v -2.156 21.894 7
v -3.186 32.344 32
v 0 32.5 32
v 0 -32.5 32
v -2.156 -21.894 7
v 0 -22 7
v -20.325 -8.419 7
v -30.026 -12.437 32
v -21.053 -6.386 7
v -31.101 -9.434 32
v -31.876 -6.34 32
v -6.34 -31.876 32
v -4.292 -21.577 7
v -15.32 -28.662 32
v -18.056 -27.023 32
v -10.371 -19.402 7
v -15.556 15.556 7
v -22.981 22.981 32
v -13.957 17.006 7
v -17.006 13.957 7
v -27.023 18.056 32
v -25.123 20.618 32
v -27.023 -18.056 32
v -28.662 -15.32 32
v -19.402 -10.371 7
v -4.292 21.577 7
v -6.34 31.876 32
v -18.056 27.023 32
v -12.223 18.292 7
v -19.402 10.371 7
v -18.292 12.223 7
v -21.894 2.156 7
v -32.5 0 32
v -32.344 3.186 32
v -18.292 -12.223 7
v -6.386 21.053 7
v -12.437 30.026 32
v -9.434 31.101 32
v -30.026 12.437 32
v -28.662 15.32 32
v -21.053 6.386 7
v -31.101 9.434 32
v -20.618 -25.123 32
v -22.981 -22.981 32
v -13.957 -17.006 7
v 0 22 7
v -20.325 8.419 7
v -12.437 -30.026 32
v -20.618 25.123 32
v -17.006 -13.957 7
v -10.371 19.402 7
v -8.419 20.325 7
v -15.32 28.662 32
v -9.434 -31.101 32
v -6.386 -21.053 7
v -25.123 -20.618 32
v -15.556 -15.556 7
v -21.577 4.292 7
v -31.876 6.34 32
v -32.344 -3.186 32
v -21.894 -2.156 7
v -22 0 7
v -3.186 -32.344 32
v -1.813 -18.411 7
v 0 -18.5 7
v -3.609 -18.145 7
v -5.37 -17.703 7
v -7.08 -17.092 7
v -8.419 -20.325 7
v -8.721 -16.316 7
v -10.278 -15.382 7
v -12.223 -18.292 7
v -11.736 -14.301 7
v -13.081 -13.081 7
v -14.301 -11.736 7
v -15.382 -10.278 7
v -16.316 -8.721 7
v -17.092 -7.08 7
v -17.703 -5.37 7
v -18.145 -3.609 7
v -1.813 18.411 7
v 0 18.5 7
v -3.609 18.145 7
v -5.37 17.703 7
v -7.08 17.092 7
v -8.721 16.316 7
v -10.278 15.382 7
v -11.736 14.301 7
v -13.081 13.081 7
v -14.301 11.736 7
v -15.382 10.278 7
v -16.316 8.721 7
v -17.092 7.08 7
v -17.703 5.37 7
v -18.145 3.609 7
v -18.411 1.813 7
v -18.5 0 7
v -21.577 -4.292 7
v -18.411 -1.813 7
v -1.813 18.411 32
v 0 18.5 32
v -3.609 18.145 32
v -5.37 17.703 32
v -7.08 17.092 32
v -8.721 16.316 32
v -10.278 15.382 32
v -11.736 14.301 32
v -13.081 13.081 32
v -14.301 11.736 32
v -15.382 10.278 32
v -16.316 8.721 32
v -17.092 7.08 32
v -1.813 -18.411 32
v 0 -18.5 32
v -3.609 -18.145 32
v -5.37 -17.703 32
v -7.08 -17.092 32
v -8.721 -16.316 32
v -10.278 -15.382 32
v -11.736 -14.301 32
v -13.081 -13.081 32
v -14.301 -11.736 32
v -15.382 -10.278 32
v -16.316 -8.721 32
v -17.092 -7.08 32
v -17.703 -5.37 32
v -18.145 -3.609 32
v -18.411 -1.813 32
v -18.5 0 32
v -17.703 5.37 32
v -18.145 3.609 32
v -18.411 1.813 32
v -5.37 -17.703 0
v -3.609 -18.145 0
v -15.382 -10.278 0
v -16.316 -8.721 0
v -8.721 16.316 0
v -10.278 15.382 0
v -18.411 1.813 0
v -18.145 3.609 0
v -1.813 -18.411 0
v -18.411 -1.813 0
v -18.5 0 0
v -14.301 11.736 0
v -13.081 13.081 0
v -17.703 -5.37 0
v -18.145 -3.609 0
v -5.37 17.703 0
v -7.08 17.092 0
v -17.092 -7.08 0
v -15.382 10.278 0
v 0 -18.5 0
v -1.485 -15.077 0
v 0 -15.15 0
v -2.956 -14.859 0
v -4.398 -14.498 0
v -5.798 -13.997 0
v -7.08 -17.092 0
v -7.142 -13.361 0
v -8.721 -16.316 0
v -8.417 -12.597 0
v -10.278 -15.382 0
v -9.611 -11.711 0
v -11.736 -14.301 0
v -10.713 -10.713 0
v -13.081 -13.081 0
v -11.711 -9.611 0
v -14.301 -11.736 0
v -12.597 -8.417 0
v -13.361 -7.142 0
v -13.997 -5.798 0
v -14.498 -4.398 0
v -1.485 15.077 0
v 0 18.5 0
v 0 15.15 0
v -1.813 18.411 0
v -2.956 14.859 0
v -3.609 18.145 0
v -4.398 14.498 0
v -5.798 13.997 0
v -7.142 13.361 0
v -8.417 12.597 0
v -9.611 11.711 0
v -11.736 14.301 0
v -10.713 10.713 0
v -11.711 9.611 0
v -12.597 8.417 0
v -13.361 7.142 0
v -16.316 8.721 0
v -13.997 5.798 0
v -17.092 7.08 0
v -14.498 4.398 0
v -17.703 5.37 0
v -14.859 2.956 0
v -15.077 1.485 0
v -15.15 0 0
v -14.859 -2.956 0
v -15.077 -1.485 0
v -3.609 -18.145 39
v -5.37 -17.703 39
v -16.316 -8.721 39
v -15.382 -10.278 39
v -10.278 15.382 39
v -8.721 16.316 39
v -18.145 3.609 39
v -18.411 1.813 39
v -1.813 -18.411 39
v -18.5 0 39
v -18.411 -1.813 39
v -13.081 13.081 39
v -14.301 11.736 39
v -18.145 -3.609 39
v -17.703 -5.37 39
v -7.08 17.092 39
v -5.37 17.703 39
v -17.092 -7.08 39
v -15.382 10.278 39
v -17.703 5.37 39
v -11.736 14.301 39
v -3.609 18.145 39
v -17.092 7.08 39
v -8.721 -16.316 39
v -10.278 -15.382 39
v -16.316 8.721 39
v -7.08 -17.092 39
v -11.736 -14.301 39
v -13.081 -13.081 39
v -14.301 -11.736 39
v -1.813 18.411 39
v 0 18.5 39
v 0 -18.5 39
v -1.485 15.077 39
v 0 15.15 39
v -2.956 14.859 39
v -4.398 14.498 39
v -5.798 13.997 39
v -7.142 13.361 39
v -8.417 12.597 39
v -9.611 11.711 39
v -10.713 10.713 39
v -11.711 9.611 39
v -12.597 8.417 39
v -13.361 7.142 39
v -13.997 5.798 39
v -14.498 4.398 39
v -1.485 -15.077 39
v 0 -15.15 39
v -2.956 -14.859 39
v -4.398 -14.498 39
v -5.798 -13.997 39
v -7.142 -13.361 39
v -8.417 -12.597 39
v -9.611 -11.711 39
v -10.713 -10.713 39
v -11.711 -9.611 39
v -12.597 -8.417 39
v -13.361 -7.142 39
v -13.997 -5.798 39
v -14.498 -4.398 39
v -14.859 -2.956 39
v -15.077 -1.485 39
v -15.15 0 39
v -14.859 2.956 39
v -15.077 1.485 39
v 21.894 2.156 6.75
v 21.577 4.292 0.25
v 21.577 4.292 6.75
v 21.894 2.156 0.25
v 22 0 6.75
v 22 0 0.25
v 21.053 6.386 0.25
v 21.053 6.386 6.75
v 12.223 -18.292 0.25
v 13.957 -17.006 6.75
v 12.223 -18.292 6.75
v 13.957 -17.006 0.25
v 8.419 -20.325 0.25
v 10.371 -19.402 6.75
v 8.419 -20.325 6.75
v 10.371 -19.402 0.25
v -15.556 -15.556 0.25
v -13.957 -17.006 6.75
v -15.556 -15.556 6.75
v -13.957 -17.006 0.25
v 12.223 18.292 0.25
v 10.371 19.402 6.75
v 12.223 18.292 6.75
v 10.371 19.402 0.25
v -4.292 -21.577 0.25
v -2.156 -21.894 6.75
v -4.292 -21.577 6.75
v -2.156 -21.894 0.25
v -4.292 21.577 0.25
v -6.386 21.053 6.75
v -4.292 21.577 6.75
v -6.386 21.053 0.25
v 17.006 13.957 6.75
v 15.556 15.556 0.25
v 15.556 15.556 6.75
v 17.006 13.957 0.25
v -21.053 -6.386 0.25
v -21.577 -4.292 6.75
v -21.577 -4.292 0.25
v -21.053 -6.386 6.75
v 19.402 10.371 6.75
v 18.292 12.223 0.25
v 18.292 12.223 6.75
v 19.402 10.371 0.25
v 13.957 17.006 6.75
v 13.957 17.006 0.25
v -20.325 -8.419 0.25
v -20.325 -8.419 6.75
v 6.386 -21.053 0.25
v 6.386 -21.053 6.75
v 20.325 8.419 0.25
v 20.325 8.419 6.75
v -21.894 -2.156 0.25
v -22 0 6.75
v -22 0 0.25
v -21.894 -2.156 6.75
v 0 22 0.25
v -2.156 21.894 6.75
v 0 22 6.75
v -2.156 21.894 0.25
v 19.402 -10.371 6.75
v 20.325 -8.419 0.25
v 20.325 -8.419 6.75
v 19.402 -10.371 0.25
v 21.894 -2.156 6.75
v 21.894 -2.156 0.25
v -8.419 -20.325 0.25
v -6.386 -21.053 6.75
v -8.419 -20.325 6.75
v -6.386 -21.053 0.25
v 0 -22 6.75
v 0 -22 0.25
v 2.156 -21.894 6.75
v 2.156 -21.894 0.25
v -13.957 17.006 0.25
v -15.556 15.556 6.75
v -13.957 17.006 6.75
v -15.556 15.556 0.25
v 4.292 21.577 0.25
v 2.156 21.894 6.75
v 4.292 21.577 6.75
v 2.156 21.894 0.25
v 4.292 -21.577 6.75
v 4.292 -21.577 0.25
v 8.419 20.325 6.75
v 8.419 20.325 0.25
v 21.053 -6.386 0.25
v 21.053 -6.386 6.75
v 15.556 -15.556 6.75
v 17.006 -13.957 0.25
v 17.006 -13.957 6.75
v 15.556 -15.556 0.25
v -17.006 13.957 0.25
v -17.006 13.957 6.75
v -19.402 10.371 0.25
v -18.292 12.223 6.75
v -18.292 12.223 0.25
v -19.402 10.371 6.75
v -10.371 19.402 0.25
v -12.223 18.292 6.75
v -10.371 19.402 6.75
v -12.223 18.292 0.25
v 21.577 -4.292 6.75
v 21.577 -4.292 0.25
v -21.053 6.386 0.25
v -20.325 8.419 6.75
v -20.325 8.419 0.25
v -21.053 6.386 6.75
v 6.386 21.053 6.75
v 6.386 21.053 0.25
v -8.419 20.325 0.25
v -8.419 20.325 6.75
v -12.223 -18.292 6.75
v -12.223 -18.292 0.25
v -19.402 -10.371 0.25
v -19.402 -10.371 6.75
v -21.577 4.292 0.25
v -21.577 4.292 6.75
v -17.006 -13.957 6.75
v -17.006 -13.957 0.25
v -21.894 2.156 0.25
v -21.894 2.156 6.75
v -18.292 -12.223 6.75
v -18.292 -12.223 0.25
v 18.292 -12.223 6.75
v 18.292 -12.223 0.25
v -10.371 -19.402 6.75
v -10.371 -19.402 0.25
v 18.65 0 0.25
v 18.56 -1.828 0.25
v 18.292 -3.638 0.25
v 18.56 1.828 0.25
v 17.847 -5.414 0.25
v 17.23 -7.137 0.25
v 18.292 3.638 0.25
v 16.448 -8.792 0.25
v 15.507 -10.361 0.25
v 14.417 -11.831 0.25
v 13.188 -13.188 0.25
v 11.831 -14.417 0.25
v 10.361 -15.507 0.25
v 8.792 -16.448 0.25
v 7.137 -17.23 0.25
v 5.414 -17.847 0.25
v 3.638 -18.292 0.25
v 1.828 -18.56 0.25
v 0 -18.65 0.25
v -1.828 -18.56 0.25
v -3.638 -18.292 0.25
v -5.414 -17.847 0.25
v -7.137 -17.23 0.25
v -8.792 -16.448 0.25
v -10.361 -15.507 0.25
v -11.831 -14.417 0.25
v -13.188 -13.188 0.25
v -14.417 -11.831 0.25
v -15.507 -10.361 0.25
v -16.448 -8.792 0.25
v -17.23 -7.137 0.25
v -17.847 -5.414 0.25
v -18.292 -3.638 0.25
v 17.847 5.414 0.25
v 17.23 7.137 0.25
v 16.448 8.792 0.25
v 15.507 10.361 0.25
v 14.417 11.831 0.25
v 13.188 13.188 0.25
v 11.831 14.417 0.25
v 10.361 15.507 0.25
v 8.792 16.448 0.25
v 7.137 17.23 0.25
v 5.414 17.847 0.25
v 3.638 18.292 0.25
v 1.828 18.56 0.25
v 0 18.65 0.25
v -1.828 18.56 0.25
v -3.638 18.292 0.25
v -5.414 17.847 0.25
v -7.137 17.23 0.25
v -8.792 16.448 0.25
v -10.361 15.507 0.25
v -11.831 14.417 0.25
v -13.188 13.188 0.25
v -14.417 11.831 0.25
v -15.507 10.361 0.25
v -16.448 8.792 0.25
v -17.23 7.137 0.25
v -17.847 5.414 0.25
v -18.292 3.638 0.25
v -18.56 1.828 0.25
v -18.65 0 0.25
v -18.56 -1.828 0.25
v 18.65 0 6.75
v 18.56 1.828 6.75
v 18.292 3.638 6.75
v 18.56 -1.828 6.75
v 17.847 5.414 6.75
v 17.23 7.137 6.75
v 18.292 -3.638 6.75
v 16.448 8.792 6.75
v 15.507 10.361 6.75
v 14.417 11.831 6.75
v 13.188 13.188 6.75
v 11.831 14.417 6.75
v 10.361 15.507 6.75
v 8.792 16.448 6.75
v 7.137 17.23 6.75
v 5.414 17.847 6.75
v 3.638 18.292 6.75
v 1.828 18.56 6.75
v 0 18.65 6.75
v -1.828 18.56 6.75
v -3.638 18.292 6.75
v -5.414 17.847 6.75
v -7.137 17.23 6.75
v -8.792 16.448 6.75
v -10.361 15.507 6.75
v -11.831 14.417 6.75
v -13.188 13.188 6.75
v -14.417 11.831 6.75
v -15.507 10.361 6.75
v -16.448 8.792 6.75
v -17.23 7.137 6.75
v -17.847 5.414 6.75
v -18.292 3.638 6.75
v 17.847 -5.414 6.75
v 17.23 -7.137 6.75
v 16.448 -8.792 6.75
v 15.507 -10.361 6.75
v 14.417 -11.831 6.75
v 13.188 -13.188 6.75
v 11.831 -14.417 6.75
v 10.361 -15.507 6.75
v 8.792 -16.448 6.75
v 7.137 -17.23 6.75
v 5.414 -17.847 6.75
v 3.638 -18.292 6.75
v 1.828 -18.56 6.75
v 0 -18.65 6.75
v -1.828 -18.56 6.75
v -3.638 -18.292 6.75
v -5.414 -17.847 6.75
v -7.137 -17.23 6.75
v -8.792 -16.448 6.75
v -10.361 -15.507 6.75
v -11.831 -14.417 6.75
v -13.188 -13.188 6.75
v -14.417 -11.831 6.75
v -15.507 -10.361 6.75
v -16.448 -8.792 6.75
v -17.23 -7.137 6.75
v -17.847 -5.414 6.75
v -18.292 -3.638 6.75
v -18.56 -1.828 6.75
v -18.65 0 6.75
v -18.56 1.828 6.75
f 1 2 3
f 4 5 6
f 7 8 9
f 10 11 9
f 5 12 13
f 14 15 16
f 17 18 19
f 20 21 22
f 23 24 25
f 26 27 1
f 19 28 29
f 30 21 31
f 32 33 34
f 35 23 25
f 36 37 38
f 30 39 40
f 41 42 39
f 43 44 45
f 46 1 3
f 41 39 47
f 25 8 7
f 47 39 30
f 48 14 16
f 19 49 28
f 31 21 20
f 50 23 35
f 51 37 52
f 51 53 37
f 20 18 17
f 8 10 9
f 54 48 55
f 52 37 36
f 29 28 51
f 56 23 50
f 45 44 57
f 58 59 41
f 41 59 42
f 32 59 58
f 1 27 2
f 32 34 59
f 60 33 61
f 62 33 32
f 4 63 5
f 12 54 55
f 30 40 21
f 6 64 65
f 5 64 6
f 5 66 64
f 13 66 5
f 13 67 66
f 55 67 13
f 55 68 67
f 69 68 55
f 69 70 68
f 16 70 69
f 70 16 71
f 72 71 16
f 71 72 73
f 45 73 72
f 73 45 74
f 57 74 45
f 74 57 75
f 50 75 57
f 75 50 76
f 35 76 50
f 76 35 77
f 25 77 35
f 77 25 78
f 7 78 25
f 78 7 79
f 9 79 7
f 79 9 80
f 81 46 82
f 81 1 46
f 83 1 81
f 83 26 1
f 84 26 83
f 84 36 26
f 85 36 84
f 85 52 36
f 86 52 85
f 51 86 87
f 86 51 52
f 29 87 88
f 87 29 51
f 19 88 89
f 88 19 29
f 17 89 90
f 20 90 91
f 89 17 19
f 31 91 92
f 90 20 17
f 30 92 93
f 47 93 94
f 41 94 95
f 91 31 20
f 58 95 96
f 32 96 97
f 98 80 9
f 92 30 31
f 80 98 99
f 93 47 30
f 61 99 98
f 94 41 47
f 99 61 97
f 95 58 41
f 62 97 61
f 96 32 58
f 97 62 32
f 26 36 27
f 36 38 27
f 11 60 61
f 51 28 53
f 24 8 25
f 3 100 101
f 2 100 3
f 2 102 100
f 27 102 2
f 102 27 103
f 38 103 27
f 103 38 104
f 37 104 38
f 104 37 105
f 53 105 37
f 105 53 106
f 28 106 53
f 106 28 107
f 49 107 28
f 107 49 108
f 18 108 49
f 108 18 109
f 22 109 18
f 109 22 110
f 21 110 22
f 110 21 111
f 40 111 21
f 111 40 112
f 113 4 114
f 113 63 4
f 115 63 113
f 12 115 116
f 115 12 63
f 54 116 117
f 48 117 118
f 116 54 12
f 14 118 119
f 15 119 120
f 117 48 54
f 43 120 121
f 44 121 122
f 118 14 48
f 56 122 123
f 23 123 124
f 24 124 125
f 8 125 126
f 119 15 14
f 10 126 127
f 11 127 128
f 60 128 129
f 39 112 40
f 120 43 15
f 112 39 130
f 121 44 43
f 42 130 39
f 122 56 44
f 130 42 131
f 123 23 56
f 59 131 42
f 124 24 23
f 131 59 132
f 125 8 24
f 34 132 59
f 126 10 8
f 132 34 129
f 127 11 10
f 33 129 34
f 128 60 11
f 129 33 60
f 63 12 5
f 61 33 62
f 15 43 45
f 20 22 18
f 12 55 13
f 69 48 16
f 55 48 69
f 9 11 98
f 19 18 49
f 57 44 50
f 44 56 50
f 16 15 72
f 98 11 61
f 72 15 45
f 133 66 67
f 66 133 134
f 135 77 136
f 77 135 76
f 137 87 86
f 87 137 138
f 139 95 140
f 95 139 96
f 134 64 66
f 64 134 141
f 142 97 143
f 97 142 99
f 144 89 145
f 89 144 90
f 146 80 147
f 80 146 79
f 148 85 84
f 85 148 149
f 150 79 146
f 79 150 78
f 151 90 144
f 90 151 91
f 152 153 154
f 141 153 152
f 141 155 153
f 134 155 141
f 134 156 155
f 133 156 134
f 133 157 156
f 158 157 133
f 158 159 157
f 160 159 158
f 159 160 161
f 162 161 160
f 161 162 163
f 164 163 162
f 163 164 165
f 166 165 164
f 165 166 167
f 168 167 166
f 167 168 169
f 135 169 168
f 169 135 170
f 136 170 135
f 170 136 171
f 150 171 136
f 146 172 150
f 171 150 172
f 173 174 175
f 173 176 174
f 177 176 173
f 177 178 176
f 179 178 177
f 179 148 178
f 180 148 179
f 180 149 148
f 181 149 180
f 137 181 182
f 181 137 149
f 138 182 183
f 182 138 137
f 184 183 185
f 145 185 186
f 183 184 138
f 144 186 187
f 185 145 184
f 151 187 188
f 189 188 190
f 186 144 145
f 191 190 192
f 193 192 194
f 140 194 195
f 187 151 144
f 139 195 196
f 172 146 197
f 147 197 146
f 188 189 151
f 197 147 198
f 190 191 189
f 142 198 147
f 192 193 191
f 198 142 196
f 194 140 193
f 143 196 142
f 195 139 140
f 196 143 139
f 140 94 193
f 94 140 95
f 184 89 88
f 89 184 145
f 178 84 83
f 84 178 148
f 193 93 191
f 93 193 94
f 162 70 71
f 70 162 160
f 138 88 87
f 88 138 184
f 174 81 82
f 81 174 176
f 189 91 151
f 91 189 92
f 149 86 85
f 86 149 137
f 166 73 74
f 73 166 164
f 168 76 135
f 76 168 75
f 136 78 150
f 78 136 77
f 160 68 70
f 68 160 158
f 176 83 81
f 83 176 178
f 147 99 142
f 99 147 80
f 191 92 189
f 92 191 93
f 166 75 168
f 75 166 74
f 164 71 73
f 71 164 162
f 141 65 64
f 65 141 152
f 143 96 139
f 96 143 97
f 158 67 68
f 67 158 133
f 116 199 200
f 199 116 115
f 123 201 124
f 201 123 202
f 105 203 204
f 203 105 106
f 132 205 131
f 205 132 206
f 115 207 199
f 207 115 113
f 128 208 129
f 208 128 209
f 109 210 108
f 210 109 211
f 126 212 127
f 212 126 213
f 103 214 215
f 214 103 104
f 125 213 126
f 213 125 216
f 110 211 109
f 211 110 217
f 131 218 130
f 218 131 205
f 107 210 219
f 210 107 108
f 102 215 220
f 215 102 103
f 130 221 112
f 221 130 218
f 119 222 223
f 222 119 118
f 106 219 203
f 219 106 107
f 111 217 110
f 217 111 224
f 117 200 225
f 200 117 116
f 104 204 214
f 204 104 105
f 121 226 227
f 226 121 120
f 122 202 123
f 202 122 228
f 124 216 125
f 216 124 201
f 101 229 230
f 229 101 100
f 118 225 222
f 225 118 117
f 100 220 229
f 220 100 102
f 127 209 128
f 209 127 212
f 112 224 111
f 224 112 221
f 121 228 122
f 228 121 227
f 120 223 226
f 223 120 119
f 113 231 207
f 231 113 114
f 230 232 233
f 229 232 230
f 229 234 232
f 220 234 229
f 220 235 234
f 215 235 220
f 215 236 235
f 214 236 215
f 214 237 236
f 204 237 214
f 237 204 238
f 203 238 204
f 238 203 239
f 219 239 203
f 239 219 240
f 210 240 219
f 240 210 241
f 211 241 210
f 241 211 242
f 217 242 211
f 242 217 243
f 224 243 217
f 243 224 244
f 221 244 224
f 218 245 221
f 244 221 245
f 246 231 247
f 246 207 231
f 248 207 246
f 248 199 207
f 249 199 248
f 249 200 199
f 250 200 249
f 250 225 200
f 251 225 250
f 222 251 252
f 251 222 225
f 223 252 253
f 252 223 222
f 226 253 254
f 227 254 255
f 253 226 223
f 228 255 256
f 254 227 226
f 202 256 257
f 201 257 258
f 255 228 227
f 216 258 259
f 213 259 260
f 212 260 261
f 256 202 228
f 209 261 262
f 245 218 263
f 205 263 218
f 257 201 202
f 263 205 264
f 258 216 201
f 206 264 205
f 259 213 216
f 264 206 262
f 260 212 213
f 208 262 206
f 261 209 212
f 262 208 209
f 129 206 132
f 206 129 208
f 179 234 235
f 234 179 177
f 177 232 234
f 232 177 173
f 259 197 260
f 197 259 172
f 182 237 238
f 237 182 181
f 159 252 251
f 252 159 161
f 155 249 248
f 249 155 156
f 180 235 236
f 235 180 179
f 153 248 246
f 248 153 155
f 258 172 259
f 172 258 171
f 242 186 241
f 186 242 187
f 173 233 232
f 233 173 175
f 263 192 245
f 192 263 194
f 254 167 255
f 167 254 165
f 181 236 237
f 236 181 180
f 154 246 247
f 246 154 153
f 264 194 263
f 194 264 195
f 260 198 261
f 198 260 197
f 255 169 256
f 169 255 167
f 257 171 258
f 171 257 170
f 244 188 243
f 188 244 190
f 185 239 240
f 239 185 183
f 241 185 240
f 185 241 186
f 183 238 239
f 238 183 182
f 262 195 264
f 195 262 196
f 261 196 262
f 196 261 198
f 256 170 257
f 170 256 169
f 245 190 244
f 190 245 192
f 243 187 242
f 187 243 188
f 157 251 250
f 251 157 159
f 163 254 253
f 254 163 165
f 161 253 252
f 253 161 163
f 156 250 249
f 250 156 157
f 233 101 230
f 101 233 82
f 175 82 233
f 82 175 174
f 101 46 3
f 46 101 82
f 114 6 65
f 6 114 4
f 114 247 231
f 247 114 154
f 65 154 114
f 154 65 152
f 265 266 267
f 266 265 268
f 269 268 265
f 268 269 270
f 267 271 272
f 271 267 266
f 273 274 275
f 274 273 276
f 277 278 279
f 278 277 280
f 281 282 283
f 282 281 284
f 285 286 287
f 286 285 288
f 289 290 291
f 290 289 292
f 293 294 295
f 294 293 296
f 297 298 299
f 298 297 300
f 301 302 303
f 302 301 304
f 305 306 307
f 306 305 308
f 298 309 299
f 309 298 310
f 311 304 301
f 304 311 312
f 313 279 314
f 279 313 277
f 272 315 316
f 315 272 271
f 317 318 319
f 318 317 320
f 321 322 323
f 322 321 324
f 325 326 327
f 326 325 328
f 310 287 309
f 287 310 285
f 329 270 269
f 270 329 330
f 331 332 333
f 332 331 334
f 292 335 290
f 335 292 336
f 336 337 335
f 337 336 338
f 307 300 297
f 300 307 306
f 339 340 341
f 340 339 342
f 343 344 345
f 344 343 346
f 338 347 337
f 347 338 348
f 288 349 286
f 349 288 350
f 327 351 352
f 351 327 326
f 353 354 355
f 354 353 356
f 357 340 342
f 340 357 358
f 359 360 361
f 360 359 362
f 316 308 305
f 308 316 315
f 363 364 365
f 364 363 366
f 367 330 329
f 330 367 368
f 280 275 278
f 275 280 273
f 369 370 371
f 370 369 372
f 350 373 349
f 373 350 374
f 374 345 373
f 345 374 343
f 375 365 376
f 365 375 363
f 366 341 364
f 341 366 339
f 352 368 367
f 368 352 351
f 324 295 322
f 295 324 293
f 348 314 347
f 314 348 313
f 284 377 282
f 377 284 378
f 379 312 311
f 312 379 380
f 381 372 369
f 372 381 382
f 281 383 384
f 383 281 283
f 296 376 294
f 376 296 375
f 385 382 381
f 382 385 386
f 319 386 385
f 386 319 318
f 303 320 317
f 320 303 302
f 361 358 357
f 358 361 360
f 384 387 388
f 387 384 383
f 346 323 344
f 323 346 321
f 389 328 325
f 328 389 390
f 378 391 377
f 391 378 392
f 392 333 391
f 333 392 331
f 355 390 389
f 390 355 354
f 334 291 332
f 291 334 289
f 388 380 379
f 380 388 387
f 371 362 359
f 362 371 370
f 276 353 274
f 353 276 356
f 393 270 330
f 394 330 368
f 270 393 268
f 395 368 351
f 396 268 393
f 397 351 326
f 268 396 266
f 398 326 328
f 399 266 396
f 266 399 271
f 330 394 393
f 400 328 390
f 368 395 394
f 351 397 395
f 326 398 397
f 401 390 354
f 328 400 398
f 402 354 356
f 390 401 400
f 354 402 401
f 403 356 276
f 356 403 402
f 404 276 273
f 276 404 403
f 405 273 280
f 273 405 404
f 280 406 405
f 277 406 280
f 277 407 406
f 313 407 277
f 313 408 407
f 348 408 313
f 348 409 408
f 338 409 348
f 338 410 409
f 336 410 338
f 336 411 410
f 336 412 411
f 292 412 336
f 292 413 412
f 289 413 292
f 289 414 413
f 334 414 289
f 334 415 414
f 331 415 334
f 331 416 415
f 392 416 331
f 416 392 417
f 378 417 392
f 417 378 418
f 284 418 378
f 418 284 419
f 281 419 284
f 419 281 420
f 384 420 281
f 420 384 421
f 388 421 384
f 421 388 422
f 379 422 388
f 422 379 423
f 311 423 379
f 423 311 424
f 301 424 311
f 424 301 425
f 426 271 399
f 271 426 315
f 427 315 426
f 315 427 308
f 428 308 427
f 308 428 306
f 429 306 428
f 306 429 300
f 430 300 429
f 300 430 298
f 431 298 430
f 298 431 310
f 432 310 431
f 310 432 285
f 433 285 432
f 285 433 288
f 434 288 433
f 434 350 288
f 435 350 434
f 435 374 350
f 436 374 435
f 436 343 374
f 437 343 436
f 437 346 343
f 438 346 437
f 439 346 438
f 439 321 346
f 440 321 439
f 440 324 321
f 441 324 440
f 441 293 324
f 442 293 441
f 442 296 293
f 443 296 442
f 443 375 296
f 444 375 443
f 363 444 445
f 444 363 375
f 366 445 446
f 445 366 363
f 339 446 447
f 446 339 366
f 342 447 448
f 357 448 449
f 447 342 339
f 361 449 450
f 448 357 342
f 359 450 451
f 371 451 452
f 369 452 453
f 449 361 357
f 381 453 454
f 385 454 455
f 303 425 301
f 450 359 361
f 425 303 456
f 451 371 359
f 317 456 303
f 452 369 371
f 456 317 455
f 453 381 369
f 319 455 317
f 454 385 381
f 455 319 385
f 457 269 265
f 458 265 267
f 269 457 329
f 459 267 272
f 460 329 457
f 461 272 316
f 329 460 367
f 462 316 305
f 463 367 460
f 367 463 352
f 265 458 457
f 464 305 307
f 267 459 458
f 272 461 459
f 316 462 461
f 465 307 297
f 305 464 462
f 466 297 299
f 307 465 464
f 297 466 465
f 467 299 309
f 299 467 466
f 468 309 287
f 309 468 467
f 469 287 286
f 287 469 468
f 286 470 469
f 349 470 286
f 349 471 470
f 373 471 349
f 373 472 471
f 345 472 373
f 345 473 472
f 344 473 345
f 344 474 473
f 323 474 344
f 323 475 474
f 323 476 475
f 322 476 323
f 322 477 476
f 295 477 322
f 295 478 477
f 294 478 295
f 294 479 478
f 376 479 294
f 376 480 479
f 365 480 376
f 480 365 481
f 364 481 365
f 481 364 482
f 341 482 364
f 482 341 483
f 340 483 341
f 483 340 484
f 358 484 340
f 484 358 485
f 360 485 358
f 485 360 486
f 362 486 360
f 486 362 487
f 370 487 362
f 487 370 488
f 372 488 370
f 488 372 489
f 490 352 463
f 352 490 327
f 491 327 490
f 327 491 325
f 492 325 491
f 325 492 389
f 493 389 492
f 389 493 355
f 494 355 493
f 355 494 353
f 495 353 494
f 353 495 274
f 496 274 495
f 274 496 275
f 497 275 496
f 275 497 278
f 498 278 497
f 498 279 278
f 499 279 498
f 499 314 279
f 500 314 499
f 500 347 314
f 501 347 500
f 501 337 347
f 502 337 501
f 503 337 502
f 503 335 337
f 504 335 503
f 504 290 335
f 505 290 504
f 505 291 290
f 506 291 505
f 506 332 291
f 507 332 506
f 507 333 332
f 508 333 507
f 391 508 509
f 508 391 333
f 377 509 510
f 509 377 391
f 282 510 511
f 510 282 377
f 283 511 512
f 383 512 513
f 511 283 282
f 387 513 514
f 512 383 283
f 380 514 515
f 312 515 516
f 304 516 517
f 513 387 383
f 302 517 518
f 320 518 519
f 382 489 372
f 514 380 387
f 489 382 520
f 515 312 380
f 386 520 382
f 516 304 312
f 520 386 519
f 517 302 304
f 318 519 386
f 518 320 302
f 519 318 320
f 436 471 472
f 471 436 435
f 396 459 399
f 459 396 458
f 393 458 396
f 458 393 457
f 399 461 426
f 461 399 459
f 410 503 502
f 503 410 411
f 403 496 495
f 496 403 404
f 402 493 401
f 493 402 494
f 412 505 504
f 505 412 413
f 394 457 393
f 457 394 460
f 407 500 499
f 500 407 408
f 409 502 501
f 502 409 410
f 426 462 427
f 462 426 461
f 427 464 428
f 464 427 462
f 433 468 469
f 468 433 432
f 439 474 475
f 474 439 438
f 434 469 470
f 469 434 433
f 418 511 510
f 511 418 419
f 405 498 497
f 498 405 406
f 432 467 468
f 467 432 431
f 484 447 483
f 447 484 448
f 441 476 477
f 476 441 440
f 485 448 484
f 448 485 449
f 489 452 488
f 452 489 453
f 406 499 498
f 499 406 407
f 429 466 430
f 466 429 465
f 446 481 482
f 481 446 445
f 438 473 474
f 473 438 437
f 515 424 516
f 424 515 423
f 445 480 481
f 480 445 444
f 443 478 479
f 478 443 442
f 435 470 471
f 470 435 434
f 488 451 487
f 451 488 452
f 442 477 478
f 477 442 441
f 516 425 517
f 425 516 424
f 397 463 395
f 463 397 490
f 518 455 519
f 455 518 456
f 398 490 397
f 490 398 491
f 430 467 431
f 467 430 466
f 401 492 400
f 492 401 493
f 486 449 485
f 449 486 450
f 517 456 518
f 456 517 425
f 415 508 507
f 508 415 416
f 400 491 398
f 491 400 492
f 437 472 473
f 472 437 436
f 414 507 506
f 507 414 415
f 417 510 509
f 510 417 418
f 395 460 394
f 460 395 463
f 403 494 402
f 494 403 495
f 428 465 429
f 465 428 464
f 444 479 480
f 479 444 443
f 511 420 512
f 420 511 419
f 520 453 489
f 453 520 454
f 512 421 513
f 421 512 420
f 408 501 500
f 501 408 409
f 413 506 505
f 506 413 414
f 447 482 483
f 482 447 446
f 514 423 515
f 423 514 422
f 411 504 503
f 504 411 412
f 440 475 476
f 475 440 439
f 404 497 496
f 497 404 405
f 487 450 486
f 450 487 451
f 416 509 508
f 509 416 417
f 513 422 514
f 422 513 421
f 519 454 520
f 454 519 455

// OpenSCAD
// 30mm holder diam
// 37mm rod_lip
// 65mm max spool size

clearance=.3;

$fn = 64;

module test_ring() {
  difference() {
    cylinder(h=5, d=50);

  translate([0,0,-.5])
    cylinder(h=6, d=37);
  }
}

module rod() {
    translate([0,0,-.5])
      cylinder(d=30+clearance, h=50);
}

module cone() {
translate([0,0,7])
  cylinder(h=25, d1=44, d2=65);

cylinder(h=7, d=37);
    
translate([0,0,32])
    cylinder(h=7, d=37);
}

module half() {
    translate([0,-32.5,-.5])
    cube([65,65,66]);
}

module spool_half() {
    difference() {
      cone();
      rod();
      half();
  }
}

module lock_ring() {
  difference() {
    translate([0,0,.25])
      cylinder(d=44, h=6.5);
  // minus...
    translate([0,0,0])
      cylinder(h=7, d=37+clearance);
  }
}

spool_half();
lock_ring();
